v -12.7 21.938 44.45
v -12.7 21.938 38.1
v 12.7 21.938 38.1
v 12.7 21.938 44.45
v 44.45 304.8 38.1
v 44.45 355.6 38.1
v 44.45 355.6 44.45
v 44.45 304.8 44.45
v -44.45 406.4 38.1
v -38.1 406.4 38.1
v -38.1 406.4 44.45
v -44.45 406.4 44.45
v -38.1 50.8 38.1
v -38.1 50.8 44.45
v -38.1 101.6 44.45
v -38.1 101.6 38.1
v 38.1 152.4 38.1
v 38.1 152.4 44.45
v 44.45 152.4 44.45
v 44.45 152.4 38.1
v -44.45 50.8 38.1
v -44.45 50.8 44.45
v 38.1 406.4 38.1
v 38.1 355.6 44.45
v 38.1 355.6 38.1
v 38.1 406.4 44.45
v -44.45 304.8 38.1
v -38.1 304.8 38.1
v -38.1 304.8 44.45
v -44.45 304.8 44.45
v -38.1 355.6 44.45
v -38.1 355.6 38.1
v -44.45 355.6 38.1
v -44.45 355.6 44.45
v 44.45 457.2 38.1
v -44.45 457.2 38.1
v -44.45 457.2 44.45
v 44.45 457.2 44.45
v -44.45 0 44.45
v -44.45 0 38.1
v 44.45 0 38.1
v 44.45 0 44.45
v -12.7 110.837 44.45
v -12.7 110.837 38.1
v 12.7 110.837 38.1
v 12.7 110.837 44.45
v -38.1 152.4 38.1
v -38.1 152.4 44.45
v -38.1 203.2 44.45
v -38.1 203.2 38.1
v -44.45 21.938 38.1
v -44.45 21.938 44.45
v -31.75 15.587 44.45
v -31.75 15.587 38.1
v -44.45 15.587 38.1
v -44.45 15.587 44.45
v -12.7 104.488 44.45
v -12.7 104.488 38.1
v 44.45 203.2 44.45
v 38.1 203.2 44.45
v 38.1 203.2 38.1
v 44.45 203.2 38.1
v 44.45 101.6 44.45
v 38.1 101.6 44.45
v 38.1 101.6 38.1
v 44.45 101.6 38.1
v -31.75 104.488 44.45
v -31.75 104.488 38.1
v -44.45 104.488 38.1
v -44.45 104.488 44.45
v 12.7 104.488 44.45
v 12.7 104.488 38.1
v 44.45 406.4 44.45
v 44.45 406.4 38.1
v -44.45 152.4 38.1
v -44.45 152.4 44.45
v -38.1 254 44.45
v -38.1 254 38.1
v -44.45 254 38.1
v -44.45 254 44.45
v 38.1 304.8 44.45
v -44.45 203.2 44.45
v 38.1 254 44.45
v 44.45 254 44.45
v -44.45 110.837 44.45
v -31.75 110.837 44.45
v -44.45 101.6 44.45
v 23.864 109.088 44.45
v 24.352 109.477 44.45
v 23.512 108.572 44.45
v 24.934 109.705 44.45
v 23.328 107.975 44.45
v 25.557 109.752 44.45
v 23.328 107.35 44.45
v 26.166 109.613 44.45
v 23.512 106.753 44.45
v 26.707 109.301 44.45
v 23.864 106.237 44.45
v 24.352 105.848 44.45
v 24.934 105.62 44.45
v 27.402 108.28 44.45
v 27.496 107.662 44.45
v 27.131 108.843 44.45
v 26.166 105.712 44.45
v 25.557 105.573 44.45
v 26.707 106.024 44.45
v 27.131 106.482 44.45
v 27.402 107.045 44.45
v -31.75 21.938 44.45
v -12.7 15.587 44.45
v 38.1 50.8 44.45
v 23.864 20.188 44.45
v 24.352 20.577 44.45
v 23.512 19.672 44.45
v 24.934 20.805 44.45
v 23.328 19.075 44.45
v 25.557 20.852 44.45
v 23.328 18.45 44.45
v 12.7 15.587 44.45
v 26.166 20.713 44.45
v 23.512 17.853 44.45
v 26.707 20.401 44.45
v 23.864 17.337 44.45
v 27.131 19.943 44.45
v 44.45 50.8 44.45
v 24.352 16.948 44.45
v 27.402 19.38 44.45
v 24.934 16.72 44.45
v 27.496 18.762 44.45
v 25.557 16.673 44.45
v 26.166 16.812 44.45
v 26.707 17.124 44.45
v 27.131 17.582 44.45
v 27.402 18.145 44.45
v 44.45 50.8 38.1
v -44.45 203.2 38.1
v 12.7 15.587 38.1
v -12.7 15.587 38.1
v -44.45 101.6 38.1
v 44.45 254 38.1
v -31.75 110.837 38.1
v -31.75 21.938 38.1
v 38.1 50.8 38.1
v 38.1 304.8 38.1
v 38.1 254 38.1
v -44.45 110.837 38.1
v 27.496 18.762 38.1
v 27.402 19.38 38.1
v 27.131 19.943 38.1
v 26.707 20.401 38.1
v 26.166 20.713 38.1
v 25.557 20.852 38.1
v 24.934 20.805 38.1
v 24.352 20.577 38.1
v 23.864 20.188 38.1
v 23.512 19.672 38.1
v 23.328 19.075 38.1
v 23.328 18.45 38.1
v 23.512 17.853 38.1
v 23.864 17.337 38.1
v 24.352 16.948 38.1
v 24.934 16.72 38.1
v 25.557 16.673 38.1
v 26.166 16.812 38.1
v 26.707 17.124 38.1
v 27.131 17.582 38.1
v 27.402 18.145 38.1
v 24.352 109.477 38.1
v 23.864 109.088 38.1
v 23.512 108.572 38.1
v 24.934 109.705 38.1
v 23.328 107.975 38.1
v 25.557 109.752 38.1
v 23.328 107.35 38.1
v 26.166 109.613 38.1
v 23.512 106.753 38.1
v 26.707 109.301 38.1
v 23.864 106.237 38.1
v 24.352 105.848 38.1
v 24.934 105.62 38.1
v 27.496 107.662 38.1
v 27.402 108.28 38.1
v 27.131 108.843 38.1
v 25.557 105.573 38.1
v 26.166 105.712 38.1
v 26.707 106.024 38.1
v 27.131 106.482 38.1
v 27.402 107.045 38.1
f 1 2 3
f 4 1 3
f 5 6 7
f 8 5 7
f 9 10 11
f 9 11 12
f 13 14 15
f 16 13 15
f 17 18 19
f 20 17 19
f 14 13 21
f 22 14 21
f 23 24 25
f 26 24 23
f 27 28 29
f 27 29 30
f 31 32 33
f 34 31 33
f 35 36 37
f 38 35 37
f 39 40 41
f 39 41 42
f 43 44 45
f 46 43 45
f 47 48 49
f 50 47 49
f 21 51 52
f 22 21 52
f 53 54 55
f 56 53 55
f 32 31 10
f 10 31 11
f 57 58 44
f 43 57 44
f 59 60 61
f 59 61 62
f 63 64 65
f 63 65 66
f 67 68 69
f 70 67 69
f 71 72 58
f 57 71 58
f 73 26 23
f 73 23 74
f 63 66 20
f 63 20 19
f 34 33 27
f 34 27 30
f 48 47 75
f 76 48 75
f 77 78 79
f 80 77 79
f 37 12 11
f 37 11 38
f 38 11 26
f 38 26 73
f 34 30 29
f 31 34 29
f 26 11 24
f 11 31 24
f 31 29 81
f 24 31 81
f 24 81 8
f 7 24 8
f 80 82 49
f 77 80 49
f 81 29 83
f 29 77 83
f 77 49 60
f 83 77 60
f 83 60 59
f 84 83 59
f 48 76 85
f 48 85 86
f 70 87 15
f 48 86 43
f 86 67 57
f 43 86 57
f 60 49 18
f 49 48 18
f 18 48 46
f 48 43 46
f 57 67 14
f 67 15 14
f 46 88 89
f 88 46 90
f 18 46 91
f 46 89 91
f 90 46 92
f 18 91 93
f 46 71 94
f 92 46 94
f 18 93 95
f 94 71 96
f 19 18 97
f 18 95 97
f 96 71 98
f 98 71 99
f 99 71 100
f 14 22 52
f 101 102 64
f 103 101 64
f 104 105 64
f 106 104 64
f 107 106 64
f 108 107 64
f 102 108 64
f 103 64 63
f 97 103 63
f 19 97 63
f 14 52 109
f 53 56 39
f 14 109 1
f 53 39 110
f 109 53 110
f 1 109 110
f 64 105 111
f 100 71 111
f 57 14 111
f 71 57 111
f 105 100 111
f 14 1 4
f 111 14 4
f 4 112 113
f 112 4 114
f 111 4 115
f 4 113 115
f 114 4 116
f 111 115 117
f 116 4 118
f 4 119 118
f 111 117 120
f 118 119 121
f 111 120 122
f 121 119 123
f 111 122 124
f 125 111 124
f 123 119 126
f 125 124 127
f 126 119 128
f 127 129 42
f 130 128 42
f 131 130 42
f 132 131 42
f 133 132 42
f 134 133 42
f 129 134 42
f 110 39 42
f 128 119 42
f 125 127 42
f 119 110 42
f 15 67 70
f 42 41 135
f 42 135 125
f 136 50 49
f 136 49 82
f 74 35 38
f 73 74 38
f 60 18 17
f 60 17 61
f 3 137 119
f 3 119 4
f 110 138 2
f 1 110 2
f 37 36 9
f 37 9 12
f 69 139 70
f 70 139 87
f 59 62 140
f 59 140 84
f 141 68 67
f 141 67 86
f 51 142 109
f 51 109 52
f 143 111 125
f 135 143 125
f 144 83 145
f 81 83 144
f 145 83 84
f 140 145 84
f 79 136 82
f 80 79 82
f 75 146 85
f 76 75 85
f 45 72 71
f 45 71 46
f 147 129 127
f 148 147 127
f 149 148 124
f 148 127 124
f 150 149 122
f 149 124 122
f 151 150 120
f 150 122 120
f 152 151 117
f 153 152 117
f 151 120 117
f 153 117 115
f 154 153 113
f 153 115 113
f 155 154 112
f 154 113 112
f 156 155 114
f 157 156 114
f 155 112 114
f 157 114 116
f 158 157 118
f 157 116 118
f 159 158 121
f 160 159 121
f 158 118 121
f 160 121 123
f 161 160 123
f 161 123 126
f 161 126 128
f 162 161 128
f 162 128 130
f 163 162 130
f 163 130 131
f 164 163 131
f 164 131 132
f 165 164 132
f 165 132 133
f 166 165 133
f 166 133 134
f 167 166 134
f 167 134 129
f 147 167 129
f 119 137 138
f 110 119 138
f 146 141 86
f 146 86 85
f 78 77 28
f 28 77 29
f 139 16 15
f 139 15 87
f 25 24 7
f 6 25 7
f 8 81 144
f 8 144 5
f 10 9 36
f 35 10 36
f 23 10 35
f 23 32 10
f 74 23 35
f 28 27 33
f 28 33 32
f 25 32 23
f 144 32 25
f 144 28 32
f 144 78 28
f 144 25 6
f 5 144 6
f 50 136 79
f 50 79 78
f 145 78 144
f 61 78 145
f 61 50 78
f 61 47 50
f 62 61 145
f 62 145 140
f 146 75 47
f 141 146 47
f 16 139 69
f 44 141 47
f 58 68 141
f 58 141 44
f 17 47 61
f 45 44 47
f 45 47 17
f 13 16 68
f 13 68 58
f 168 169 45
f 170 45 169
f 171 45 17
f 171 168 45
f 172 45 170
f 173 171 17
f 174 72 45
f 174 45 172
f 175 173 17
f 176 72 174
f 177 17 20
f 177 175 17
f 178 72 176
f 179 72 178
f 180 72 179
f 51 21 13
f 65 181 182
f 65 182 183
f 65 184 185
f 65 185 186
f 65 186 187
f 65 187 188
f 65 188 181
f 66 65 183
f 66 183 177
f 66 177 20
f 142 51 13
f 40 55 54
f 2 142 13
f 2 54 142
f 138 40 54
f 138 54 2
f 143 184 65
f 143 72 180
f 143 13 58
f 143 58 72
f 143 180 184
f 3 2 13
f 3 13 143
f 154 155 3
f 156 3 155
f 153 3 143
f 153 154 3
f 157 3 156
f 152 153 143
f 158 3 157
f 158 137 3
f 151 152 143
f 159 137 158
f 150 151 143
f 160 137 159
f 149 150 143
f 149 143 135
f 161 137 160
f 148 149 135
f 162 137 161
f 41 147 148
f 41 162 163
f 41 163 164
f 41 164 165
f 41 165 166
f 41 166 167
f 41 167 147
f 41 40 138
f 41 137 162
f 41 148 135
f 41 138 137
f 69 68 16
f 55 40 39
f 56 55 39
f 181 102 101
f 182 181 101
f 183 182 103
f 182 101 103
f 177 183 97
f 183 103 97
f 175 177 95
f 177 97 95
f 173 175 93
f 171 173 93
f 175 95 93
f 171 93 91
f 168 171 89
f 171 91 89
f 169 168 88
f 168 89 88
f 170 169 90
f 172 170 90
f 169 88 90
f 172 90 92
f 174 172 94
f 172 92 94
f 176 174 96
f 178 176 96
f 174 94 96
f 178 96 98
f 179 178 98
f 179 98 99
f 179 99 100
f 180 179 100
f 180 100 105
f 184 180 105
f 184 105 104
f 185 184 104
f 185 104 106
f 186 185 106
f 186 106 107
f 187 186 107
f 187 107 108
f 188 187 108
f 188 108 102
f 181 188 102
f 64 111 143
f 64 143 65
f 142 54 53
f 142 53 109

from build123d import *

# Parameters (mm, degrees)
SKETCH2_W           = 6.35
SKETCH2_H           = 88.9
BOSS_EXTRUDE1_DEPTH = 457.2
SKETCH4_W           = 6.35
SKETCH4_H           = 50.8
CUT_EXTRUDE1_DEPTH  = 460.399570091
SKETCH5_W           = 12.7
SKETCH5_H           = 6.35
CUT_EXTRUDE2_DEPTH  = 460.399570091
SKETCH6_R           = 2.0955
CUT_EXTRUDE3_DEPTH  = 460.399570091
SKETCH7_W           = 12.7
SKETCH7_H           = 6.35
CUT_EXTRUDE4_DEPTH  = 10
SKETCH8_W           = 12.7
SKETCH8_H           = 6.35
CUT_EXTRUDE5_DEPTH  = 460.399570091


with BuildPart() as part:
    # Sketch2 → Boss-Extrude1 (new body)
    with BuildSketch(Plane.ZX):
        with Locations((41.275, 0)):
            Rectangle(SKETCH2_W, SKETCH2_H)
    extrude(amount=BOSS_EXTRUDE1_DEPTH)

    # Sketch4 → Cut-Extrude1 (cut, through all)
    with BuildSketch(Plane.XY.offset(44.45)):
        with Locations((41.275, 381)):
            Rectangle(SKETCH4_W, SKETCH4_H)
        with Locations((41.275, 279.4)):
            Rectangle(SKETCH4_W, SKETCH4_H)
        with Locations((41.275, 177.8)):
            Rectangle(SKETCH4_W, SKETCH4_H)
        with Locations((41.275, 76.2)):
            Rectangle(SKETCH4_W, SKETCH4_H)
    cut_extrude1 = extrude(amount=-CUT_EXTRUDE1_DEPTH, mode=Mode.SUBTRACT)

    # Mirror1: Cut-Extrude1 across plane
    add(cut_extrude1.mirror(Plane(origin=(0, 0, 0), x_dir=(0, 0, 1), z_dir=(1, 0, 0))), mode=Mode.SUBTRACT)

    # Sketch5 → Cut-Extrude2 (cut, through all)
    with BuildSketch(Plane(origin=(0, 0, 38.1), x_dir=(-1, 0, 0), z_dir=(0, 0, -1))):
        with Locations((6.35, 18.7625)):
            Rectangle(SKETCH5_W, SKETCH5_H)
        with Locations((-6.35, 18.7625)):
            Rectangle(SKETCH5_W, SKETCH5_H)
        with Locations((6.35, 107.6625)):
            Rectangle(SKETCH5_W, SKETCH5_H)
        with Locations((-6.35, 107.6625)):
            Rectangle(SKETCH5_W, SKETCH5_H)
    extrude(amount=-CUT_EXTRUDE2_DEPTH, mode=Mode.SUBTRACT)

    # Sketch6 → Cut-Extrude3 (cut, through all)
    with BuildSketch(Plane.XY.offset(44.45)):
        with Locations((25.4, 107.6625)):
            Circle(SKETCH6_R)
        with Locations((25.4, 18.7625)):
            Circle(SKETCH6_R)
    extrude(amount=-CUT_EXTRUDE3_DEPTH, mode=Mode.SUBTRACT)

    # Sketch7 → Cut-Extrude4 (cut)
    with BuildSketch(Plane(origin=(0, 0, 38.1), x_dir=(-1, 0, 0), z_dir=(0, 0, -1))):
        with Locations((38.1, 107.6625)):
            Rectangle(SKETCH7_W, SKETCH7_H)
    extrude(amount=-CUT_EXTRUDE4_DEPTH, mode=Mode.SUBTRACT)

    # Sketch8 → Cut-Extrude5 (cut, through all)
    with BuildSketch(Plane(origin=(0, 0, 38.1), x_dir=(-1, 0, 0), z_dir=(0, 0, -1))):
        with Locations((38.1, 18.7625)):
            Rectangle(SKETCH8_W, SKETCH8_H)
    extrude(amount=-CUT_EXTRUDE5_DEPTH, mode=Mode.SUBTRACT)


solid = part.part
